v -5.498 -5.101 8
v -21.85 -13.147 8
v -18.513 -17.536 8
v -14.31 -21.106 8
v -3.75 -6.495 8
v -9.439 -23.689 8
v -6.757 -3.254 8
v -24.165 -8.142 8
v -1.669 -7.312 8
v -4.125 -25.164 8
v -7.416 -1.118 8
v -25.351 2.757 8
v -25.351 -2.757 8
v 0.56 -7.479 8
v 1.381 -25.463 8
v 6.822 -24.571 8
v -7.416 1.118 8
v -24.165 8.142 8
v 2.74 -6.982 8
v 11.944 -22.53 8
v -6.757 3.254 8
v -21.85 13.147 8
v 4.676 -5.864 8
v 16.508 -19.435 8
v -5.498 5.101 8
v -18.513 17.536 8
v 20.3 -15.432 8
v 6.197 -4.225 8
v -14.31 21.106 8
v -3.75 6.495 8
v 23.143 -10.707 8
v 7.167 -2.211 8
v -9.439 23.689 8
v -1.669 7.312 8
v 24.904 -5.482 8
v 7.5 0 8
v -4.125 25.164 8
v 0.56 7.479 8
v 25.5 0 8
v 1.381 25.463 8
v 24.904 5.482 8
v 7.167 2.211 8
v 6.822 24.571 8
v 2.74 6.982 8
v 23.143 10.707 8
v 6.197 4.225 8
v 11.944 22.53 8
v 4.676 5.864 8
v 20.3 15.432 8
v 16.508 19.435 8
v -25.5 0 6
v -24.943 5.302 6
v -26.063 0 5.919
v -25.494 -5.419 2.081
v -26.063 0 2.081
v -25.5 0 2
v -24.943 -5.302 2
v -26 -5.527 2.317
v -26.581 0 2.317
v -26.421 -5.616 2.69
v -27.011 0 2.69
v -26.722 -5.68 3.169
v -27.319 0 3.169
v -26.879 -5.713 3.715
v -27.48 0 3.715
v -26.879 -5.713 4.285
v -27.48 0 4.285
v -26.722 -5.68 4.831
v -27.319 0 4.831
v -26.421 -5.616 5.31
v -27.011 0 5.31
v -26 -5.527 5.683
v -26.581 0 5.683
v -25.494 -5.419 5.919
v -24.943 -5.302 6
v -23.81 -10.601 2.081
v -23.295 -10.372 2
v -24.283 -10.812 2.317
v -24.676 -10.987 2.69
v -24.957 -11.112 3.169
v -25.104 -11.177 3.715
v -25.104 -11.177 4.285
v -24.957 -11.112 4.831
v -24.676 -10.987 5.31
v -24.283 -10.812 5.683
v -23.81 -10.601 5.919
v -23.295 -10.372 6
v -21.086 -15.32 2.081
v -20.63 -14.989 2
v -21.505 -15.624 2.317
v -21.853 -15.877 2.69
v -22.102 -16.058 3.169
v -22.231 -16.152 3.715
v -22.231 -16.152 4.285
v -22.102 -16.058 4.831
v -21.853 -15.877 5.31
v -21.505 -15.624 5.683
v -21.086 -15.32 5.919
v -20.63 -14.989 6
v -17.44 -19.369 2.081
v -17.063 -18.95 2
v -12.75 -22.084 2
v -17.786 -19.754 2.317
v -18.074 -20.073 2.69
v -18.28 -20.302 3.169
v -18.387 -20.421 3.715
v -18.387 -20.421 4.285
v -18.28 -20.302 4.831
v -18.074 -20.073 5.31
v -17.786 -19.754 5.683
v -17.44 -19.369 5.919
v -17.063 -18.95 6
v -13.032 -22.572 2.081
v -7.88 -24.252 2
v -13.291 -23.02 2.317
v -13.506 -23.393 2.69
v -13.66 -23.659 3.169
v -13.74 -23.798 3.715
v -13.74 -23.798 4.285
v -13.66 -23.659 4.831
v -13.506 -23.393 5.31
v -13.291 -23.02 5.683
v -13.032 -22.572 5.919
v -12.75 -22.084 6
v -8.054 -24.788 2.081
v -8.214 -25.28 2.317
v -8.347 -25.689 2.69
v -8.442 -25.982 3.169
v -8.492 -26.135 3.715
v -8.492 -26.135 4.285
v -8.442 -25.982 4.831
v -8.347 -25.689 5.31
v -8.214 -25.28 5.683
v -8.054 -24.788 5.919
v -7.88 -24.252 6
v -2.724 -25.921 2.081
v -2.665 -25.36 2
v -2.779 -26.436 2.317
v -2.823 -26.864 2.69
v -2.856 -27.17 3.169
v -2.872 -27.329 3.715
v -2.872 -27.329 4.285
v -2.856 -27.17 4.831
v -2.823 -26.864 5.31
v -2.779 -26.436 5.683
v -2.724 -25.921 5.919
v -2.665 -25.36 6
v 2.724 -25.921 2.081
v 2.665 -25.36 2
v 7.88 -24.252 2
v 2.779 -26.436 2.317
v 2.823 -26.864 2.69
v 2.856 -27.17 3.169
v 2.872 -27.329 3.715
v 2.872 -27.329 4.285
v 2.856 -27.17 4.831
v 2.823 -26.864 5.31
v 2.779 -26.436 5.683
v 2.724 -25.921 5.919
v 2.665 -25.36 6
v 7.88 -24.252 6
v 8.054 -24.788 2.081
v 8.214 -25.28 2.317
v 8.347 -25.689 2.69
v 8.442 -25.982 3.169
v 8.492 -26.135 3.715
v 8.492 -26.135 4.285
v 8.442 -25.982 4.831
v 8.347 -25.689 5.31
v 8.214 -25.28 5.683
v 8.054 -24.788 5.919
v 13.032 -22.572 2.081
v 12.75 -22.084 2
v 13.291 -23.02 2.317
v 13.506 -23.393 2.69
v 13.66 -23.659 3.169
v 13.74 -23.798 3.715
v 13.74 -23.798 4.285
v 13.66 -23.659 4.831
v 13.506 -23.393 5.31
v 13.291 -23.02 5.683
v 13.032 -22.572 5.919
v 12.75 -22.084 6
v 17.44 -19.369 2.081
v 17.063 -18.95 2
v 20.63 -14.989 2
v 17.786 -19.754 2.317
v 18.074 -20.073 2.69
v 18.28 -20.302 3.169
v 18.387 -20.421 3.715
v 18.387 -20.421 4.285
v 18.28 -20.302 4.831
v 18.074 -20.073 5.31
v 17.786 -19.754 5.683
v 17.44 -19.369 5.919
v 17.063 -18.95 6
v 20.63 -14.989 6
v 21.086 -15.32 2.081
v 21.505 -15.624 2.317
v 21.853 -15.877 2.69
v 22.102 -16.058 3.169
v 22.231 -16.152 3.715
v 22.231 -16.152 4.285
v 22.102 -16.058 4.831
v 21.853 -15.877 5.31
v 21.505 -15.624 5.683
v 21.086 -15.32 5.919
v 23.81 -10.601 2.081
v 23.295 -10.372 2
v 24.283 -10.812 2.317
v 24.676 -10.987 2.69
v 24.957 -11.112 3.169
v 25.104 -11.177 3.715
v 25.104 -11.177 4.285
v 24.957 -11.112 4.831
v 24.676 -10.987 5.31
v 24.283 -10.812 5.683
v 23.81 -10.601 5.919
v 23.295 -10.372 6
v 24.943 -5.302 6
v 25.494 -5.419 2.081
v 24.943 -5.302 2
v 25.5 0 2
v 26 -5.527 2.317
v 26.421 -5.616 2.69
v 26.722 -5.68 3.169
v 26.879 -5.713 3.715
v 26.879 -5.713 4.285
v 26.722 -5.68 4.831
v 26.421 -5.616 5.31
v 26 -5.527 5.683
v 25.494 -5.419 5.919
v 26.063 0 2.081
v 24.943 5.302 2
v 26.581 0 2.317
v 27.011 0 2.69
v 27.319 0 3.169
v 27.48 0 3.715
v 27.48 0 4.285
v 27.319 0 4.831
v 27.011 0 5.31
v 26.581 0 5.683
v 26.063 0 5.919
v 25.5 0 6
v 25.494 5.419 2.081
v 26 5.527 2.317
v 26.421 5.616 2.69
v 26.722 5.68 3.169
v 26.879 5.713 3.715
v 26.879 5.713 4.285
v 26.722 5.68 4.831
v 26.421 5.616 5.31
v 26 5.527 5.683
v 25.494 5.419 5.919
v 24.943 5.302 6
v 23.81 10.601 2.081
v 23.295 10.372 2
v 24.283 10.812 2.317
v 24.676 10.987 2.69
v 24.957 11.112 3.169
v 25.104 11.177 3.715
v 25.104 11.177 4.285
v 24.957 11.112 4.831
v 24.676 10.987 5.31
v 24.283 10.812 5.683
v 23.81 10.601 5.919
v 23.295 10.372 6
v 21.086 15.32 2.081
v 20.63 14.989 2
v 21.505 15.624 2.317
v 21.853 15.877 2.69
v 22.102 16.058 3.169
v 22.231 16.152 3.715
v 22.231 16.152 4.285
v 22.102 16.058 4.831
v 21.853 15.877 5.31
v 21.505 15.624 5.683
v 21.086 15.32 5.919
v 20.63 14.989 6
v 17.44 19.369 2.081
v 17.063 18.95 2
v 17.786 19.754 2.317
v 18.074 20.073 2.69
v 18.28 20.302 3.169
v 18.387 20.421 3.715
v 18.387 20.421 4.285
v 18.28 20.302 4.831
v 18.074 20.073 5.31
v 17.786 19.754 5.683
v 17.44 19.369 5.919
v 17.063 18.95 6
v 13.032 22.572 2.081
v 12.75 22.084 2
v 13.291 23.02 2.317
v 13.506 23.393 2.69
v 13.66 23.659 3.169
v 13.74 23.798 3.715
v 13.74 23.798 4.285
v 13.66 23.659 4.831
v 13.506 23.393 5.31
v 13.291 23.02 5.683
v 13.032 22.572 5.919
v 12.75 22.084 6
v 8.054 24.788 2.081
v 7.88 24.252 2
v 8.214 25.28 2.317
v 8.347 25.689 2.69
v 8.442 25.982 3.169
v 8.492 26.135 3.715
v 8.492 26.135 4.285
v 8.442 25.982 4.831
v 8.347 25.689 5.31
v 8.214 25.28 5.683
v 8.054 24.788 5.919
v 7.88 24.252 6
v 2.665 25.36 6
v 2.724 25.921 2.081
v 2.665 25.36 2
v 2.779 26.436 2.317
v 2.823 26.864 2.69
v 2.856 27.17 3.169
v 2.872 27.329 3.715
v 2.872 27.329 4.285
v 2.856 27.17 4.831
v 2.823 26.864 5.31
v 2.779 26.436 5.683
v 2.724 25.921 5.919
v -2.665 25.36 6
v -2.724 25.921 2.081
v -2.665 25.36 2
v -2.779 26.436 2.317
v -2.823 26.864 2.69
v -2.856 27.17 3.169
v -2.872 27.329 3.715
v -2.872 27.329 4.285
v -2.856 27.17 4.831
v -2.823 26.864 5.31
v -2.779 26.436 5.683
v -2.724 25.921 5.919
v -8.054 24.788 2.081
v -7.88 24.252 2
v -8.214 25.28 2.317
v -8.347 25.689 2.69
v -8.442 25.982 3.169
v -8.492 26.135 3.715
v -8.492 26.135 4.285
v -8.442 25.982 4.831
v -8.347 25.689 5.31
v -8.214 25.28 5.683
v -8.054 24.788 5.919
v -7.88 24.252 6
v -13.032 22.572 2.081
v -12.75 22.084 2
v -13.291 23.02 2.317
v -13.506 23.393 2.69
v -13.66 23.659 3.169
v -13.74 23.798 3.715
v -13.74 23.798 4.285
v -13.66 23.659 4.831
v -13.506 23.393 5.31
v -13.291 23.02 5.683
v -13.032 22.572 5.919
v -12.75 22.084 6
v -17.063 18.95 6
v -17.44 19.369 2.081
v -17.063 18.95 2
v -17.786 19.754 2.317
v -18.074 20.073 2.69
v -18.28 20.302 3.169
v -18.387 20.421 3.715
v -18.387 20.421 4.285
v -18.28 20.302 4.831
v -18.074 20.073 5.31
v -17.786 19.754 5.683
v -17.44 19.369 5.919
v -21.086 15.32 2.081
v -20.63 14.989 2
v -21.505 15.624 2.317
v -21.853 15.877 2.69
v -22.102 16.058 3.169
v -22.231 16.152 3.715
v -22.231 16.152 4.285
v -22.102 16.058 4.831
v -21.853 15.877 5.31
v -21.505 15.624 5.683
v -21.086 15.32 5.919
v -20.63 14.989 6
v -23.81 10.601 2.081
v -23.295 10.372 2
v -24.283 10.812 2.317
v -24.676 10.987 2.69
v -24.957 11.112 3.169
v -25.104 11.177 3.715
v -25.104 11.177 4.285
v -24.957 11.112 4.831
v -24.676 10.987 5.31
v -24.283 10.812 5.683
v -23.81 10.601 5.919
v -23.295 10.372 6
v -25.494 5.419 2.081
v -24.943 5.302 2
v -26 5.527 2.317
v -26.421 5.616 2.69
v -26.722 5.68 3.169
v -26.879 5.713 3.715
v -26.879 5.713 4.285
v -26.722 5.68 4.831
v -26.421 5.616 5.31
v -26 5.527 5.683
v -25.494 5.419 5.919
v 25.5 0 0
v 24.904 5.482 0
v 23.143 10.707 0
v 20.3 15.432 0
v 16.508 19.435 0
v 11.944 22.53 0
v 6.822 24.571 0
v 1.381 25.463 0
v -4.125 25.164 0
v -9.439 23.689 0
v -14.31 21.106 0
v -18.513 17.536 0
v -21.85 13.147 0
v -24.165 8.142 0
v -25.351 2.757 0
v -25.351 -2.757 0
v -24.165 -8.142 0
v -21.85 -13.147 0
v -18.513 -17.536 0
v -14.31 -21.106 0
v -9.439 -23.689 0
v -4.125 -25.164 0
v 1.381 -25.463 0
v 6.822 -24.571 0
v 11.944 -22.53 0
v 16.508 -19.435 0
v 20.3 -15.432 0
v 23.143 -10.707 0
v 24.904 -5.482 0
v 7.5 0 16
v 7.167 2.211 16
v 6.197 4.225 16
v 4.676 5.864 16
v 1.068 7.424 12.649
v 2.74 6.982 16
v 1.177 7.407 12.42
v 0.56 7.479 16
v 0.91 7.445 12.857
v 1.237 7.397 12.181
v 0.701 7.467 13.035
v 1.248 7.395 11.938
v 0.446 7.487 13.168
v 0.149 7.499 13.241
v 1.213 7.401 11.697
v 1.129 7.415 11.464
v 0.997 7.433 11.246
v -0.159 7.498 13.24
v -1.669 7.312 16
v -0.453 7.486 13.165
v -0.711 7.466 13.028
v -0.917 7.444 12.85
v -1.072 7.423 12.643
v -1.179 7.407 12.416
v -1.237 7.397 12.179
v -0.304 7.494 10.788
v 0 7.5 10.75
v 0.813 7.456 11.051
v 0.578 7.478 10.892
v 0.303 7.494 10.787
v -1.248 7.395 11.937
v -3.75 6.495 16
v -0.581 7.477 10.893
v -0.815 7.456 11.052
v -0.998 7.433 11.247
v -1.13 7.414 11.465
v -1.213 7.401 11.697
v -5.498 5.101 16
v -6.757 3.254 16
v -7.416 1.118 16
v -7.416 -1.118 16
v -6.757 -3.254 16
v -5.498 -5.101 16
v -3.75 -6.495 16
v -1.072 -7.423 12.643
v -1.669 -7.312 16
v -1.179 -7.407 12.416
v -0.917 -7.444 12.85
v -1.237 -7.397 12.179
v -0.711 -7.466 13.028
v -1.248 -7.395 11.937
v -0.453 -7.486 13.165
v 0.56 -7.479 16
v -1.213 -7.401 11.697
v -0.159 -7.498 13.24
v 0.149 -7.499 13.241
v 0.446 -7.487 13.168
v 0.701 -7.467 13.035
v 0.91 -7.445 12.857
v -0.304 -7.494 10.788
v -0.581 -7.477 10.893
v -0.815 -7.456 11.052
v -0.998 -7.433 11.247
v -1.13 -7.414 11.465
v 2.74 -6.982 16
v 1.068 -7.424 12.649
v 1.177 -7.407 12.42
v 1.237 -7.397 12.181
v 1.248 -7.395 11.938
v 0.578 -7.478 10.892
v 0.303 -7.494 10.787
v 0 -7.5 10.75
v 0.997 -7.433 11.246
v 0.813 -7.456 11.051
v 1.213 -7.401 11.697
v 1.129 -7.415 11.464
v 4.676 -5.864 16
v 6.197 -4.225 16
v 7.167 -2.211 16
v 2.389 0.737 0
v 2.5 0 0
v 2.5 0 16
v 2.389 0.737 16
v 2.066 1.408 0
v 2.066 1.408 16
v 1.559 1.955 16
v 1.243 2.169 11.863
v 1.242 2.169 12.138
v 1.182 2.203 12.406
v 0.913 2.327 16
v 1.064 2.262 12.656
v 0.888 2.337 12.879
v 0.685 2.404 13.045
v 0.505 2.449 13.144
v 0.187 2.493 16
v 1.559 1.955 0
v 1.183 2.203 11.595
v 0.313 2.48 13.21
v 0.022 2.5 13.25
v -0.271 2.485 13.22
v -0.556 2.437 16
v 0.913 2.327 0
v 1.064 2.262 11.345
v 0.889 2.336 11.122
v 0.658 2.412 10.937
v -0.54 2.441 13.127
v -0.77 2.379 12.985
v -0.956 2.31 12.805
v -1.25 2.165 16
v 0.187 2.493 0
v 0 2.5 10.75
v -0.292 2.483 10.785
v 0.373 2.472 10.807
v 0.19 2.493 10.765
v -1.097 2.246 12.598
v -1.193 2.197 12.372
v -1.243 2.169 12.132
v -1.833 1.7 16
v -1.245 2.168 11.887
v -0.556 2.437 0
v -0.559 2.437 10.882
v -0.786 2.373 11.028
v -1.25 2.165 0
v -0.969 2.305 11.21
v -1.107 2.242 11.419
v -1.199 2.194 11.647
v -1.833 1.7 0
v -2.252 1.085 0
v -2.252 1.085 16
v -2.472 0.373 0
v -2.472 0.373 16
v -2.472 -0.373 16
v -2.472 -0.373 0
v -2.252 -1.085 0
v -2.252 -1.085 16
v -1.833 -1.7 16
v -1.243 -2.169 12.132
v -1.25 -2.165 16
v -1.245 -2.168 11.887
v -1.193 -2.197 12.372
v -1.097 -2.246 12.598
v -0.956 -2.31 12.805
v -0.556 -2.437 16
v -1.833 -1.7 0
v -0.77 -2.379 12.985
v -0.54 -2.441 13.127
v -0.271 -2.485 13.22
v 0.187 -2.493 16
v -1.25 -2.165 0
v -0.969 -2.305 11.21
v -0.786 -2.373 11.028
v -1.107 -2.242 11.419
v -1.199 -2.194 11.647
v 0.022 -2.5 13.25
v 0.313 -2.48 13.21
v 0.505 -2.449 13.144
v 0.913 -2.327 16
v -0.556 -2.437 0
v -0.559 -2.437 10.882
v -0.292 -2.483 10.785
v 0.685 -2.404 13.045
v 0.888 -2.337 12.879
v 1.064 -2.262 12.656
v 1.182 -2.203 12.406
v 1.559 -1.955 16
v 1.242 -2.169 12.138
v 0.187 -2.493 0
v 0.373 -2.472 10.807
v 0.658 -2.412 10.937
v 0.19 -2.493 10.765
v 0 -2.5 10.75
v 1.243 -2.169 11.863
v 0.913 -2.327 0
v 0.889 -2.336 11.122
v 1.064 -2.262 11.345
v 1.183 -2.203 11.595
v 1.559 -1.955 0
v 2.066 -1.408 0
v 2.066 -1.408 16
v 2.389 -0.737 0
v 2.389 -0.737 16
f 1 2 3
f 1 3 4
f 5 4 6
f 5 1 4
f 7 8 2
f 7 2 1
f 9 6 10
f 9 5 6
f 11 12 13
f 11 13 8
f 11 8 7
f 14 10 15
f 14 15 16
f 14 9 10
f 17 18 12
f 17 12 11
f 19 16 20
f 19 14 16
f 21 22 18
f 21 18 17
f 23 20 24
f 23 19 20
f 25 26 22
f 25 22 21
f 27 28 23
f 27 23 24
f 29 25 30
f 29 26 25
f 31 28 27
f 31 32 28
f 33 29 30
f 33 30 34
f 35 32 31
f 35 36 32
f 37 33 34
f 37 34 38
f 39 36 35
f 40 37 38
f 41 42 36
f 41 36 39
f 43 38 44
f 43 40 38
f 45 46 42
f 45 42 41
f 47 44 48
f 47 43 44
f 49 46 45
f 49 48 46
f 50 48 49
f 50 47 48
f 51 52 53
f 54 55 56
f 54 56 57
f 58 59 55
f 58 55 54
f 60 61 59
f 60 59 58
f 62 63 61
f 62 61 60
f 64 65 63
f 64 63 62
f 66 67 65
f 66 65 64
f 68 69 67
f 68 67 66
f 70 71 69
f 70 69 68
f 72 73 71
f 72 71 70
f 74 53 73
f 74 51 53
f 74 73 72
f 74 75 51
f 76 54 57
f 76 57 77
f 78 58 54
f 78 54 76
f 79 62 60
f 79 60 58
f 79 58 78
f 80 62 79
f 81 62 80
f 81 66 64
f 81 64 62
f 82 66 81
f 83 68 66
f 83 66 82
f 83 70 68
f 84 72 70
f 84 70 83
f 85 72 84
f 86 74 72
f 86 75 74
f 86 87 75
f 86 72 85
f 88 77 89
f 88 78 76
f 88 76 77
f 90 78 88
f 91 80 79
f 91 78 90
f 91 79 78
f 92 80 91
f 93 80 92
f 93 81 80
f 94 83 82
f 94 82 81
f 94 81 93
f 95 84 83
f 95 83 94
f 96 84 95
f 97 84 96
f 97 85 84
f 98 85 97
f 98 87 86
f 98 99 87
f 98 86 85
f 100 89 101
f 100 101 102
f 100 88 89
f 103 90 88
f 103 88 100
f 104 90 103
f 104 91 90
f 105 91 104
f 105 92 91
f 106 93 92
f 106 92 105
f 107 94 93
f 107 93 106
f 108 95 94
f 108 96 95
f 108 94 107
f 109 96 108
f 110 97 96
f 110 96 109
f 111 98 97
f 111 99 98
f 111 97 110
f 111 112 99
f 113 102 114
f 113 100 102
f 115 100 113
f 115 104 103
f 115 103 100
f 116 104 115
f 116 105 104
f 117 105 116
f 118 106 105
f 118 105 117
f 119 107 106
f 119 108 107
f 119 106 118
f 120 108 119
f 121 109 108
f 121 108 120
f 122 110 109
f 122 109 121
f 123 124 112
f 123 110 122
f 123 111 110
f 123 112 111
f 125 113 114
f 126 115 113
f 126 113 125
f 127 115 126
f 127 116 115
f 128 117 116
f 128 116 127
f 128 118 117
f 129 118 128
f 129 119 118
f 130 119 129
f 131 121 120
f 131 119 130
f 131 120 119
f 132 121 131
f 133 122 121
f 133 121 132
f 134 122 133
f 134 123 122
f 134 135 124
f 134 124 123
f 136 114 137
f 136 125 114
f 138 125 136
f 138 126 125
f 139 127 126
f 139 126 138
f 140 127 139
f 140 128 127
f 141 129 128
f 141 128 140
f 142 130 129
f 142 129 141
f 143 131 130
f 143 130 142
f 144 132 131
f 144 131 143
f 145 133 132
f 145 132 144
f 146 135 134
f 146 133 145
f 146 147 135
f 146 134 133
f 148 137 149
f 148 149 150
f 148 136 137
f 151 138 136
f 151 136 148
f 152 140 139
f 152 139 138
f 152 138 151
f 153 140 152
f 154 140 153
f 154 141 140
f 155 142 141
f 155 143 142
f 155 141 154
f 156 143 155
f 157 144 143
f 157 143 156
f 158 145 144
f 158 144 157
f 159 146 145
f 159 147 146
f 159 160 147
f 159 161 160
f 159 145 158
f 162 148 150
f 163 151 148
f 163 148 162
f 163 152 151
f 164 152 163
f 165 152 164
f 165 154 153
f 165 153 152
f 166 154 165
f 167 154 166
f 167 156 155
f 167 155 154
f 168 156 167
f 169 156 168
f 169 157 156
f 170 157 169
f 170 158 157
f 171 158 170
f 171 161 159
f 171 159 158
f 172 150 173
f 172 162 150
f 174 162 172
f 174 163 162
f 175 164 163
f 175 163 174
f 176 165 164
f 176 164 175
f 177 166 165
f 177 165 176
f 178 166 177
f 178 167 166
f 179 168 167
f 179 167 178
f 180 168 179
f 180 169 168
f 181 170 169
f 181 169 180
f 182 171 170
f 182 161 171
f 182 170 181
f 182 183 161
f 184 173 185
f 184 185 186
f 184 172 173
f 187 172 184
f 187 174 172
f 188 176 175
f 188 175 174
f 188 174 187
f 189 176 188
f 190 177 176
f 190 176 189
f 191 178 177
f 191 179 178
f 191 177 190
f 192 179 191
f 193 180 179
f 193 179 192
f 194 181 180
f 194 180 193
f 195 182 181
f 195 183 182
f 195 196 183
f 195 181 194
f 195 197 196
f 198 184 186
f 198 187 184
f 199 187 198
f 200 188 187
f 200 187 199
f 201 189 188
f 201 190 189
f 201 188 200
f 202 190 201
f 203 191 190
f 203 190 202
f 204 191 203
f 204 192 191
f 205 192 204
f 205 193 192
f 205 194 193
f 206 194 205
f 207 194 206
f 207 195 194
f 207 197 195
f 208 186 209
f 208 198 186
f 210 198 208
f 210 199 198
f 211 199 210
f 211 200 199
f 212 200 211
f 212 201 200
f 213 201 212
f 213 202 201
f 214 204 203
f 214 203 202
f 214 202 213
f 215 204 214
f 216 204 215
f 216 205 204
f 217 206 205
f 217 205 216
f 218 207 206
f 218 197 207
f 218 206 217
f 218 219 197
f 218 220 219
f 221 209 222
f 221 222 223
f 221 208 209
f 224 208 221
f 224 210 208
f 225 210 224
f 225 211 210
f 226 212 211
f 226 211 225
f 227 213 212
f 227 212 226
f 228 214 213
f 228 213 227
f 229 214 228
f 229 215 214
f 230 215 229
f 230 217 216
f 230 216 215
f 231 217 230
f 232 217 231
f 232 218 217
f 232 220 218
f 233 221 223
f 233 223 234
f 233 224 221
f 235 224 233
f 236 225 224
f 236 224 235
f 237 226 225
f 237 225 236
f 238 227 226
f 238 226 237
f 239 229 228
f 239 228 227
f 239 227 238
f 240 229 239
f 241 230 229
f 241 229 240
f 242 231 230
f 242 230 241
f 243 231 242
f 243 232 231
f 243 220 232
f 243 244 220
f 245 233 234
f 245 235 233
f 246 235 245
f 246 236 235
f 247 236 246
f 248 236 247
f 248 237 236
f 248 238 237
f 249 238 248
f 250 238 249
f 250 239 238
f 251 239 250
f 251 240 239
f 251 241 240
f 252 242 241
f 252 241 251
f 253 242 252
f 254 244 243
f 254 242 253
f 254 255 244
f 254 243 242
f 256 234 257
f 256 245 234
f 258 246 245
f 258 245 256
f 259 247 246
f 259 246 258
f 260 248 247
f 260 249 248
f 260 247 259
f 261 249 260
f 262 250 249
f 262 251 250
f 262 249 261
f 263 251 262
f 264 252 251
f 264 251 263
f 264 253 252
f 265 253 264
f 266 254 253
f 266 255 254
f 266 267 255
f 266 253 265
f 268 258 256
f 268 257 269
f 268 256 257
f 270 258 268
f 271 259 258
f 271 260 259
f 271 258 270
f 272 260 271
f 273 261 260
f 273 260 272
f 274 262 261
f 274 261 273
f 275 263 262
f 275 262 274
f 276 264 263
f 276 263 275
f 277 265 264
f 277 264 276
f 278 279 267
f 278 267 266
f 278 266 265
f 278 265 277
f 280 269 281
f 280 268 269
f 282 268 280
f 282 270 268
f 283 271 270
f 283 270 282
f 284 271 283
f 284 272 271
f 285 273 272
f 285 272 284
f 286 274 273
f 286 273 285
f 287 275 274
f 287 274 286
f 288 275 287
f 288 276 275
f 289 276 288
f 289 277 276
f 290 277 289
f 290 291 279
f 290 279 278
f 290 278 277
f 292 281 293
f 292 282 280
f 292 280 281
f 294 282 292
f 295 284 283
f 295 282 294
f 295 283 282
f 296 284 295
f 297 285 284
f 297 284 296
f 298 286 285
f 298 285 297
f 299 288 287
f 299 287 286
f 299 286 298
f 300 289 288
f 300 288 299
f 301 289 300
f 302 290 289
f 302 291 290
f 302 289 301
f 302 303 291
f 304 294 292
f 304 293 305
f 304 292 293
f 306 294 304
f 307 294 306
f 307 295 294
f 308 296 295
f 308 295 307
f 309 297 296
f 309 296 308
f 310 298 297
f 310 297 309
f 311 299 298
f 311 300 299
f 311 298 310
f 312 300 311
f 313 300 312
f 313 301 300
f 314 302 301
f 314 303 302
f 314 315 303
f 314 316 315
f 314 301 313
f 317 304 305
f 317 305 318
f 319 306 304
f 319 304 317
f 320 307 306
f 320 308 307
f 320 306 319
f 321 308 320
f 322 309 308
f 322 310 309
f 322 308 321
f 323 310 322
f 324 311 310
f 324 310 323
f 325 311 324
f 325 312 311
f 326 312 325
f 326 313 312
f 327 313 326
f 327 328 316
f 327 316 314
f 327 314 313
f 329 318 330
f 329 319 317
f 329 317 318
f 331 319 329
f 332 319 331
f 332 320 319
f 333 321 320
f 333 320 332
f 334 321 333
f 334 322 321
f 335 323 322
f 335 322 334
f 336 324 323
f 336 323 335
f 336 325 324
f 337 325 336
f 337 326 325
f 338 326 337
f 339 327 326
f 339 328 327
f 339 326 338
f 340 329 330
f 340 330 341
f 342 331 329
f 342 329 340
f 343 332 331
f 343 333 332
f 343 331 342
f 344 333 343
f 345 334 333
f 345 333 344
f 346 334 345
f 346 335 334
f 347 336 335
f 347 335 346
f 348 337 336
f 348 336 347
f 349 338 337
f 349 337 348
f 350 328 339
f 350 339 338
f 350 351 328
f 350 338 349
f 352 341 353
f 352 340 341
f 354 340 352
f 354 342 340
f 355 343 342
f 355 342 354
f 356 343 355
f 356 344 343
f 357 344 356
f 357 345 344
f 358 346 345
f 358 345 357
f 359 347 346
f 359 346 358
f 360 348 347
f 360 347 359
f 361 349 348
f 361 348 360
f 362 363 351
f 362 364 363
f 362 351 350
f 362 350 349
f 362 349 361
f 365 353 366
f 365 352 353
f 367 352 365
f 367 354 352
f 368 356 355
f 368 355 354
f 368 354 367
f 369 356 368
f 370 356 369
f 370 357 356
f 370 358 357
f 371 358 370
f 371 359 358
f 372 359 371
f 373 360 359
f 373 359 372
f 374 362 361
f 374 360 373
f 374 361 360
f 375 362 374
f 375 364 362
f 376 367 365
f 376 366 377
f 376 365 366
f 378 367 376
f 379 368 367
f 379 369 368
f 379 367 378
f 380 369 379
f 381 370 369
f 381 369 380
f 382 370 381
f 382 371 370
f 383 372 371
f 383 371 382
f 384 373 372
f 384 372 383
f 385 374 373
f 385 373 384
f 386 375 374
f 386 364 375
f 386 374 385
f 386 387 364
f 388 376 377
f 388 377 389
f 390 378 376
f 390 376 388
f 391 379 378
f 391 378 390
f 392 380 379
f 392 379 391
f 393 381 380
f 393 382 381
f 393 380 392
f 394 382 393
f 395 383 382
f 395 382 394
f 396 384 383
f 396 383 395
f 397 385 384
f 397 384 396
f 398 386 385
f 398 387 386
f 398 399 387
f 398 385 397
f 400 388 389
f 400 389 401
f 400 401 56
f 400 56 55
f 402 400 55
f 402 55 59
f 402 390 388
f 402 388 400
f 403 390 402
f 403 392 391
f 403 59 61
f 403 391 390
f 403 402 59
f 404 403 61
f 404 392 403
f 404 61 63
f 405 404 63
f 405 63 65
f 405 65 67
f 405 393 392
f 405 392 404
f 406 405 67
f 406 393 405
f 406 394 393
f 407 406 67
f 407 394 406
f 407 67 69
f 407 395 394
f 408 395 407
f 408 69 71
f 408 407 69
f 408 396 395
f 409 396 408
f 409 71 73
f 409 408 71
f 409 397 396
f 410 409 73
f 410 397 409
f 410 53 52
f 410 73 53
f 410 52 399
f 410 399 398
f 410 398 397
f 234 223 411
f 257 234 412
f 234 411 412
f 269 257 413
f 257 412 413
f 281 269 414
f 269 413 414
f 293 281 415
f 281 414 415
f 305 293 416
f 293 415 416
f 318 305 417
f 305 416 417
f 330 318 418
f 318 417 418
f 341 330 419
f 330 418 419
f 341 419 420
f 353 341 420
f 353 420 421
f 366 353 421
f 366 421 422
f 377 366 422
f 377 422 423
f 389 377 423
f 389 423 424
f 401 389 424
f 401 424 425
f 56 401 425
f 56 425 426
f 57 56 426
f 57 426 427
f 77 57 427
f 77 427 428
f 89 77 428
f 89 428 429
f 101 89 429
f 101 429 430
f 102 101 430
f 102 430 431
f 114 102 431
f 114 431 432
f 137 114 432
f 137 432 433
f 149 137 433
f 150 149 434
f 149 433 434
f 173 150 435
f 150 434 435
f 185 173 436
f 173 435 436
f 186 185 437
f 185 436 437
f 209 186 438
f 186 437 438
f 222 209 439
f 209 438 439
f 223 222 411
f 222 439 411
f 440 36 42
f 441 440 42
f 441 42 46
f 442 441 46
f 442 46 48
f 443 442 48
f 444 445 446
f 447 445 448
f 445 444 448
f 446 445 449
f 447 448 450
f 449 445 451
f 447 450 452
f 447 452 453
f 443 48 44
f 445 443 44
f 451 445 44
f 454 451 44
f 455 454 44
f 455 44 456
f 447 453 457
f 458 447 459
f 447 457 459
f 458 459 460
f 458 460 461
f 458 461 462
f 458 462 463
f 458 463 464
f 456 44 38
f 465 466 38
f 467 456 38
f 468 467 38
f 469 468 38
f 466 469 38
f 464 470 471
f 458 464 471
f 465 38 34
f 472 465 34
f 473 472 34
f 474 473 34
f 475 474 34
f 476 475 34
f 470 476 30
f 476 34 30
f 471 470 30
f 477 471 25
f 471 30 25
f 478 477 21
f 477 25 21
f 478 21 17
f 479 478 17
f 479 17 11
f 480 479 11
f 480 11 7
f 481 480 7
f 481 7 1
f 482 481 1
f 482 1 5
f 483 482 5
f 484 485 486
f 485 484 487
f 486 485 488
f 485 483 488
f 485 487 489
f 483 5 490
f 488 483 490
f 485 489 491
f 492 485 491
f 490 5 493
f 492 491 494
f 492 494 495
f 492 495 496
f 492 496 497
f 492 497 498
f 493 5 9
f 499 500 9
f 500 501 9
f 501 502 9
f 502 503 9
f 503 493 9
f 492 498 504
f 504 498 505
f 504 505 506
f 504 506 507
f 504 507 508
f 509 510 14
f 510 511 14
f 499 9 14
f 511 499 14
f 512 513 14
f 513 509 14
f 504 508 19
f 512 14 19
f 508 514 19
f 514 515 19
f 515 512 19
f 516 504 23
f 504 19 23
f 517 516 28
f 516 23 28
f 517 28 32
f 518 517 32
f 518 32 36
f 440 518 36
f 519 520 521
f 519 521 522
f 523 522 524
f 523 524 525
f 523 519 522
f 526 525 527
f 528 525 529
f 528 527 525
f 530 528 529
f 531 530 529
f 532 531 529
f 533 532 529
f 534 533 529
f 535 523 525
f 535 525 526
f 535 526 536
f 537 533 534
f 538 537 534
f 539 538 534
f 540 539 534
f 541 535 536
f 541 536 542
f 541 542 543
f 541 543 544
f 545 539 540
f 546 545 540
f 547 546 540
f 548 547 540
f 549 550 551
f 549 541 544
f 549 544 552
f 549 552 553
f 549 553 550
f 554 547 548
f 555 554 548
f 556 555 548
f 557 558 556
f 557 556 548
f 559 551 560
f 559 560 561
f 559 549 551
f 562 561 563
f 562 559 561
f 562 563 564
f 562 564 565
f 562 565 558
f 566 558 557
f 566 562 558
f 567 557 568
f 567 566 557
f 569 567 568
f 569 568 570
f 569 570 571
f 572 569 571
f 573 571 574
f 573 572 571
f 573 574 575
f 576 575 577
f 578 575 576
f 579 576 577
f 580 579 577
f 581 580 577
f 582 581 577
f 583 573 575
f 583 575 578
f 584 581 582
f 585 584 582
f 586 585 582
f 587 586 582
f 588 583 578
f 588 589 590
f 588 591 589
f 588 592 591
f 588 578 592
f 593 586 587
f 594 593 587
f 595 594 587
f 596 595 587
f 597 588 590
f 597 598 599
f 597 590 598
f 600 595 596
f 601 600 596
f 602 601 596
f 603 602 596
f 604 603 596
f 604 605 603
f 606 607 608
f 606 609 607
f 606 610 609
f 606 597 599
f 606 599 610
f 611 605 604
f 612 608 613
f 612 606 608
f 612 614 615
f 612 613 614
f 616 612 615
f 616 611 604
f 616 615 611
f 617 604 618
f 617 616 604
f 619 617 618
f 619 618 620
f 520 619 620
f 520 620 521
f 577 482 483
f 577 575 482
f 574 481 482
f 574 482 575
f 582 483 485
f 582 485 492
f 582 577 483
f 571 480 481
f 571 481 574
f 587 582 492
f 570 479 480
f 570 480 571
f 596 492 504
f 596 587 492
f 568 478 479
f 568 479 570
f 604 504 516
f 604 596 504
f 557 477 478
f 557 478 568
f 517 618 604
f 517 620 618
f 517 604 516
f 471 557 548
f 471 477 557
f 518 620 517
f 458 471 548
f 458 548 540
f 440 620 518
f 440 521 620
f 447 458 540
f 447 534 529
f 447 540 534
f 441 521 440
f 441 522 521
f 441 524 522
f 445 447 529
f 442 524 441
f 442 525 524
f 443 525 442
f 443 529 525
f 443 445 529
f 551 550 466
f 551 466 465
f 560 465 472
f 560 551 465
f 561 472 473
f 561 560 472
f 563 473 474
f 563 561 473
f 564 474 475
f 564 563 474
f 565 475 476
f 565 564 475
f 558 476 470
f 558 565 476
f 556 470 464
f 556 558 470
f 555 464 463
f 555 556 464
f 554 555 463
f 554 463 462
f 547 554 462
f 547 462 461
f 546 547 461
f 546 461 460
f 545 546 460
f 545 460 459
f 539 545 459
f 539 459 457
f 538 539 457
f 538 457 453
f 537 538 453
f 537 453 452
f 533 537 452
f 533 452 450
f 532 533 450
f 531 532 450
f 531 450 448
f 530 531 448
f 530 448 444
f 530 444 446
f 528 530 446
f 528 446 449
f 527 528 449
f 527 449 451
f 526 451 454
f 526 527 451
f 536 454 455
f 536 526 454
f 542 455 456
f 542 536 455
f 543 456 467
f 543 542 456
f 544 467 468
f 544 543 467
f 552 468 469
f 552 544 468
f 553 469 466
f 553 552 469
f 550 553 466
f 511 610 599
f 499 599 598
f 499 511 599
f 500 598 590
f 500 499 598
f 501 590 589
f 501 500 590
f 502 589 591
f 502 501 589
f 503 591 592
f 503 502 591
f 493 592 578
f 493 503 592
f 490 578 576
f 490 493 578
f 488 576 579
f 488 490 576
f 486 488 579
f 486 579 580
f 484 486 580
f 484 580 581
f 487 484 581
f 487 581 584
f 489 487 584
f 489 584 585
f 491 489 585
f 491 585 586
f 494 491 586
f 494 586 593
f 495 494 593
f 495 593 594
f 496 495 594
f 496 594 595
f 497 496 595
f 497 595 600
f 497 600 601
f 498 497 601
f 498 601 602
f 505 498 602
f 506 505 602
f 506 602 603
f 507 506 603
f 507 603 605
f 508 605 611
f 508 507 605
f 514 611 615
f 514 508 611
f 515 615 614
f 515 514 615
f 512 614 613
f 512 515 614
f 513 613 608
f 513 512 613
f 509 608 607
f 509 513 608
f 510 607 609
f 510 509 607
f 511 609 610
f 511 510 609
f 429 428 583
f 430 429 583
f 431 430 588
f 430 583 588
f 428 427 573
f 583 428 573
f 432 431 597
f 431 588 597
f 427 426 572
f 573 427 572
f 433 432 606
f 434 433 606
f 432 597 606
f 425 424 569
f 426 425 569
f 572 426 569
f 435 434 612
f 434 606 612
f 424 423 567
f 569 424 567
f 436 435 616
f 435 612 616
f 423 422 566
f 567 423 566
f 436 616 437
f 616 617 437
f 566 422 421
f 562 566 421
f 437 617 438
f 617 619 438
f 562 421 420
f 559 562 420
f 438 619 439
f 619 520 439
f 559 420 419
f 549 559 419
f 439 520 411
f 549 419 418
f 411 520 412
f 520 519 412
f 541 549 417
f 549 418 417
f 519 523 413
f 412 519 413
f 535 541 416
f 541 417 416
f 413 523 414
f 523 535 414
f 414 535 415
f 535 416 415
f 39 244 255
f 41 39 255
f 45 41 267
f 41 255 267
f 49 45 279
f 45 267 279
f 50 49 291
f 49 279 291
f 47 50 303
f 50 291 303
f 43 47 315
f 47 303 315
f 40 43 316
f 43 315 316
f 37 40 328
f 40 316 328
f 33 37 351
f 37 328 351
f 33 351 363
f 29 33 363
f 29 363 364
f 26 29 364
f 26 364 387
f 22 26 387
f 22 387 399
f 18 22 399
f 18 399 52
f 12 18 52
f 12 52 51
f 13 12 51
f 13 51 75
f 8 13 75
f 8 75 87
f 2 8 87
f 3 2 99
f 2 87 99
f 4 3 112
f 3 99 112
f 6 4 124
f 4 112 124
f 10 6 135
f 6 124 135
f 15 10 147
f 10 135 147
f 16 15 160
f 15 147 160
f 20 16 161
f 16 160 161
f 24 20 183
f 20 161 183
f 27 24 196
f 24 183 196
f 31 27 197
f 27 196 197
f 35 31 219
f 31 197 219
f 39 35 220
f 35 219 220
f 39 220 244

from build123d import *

# Parameters (mm, degrees)
SKETCH_1_R               = 25.5
SKETCH_1_R_2             = 2.5
EXTRUDE_1_DEPTH          = 8
SKETCH_2_R               = 7.5
SKETCH_2_R_2             = 2.5
EXTRUDE_2_DEPTH          = 8
CUT_EXTRUDE_2_DEPTH      = 10
CUT_EXTRUDE_2_DEPTH_BACK = 10
SKETCH_4_R               = 1.25
SKETCH_6_R               = 2


with BuildPart() as part:
    # Эскиз1 → Бобышка-Вытянуть1 (new body)
    with BuildSketch(Plane.XY):
        Circle(SKETCH_1_R)
        Circle(SKETCH_1_R_2, mode=Mode.SUBTRACT)
    extrude(amount=EXTRUDE_1_DEPTH)

    # Эскиз2 → Бобышка-Вытянуть2 (add)
    with BuildSketch(Plane.XY.offset(8)):
        Circle(SKETCH_2_R)
        Circle(SKETCH_2_R_2, mode=Mode.SUBTRACT)
    extrude(amount=EXTRUDE_2_DEPTH)

    # Эскиз4 → Вырез-Вытянуть2 (cut, two sides: drawn at the far end of the back side and taken through both)
    with BuildSketch(Plane(origin=(0, 0, 0), x_dir=(1, 0, 0), z_dir=(0, 1, 0)).offset(-CUT_EXTRUDE_2_DEPTH_BACK)):
        with Locations((0, -12)):
            Circle(SKETCH_4_R)
    extrude(amount=CUT_EXTRUDE_2_DEPTH + CUT_EXTRUDE_2_DEPTH_BACK, mode=Mode.SUBTRACT)

    # Эскиз5 → Вырез-Повернуть1 (revolve, cut)
    with BuildSketch(Plane(origin=(0, 0, 0), x_dir=(0, 0, -1), z_dir=(1, 0, 0))):
        with BuildLine():
            Line((-6, 25.5), (-2, 25.5))
            ThreePointArc((-2, 25.5), (-4, 23.5), (-6, 25.5))
        make_face()
    revolve(axis=Axis((0, 0, 0), (0, 0, 1)), mode=Mode.SUBTRACT)

    # Эскиз6 → Повернуть1 (revolve)
    with BuildSketch(Plane(origin=(0, 0, 0), x_dir=(0, 0, -1), z_dir=(1, 0, 0))):
        with Locations((-4, 25.5)):
            Circle(SKETCH_6_R)
    revolve(axis=Axis((0, 0, 0), (0, 0, 1)))


solid = part.part
